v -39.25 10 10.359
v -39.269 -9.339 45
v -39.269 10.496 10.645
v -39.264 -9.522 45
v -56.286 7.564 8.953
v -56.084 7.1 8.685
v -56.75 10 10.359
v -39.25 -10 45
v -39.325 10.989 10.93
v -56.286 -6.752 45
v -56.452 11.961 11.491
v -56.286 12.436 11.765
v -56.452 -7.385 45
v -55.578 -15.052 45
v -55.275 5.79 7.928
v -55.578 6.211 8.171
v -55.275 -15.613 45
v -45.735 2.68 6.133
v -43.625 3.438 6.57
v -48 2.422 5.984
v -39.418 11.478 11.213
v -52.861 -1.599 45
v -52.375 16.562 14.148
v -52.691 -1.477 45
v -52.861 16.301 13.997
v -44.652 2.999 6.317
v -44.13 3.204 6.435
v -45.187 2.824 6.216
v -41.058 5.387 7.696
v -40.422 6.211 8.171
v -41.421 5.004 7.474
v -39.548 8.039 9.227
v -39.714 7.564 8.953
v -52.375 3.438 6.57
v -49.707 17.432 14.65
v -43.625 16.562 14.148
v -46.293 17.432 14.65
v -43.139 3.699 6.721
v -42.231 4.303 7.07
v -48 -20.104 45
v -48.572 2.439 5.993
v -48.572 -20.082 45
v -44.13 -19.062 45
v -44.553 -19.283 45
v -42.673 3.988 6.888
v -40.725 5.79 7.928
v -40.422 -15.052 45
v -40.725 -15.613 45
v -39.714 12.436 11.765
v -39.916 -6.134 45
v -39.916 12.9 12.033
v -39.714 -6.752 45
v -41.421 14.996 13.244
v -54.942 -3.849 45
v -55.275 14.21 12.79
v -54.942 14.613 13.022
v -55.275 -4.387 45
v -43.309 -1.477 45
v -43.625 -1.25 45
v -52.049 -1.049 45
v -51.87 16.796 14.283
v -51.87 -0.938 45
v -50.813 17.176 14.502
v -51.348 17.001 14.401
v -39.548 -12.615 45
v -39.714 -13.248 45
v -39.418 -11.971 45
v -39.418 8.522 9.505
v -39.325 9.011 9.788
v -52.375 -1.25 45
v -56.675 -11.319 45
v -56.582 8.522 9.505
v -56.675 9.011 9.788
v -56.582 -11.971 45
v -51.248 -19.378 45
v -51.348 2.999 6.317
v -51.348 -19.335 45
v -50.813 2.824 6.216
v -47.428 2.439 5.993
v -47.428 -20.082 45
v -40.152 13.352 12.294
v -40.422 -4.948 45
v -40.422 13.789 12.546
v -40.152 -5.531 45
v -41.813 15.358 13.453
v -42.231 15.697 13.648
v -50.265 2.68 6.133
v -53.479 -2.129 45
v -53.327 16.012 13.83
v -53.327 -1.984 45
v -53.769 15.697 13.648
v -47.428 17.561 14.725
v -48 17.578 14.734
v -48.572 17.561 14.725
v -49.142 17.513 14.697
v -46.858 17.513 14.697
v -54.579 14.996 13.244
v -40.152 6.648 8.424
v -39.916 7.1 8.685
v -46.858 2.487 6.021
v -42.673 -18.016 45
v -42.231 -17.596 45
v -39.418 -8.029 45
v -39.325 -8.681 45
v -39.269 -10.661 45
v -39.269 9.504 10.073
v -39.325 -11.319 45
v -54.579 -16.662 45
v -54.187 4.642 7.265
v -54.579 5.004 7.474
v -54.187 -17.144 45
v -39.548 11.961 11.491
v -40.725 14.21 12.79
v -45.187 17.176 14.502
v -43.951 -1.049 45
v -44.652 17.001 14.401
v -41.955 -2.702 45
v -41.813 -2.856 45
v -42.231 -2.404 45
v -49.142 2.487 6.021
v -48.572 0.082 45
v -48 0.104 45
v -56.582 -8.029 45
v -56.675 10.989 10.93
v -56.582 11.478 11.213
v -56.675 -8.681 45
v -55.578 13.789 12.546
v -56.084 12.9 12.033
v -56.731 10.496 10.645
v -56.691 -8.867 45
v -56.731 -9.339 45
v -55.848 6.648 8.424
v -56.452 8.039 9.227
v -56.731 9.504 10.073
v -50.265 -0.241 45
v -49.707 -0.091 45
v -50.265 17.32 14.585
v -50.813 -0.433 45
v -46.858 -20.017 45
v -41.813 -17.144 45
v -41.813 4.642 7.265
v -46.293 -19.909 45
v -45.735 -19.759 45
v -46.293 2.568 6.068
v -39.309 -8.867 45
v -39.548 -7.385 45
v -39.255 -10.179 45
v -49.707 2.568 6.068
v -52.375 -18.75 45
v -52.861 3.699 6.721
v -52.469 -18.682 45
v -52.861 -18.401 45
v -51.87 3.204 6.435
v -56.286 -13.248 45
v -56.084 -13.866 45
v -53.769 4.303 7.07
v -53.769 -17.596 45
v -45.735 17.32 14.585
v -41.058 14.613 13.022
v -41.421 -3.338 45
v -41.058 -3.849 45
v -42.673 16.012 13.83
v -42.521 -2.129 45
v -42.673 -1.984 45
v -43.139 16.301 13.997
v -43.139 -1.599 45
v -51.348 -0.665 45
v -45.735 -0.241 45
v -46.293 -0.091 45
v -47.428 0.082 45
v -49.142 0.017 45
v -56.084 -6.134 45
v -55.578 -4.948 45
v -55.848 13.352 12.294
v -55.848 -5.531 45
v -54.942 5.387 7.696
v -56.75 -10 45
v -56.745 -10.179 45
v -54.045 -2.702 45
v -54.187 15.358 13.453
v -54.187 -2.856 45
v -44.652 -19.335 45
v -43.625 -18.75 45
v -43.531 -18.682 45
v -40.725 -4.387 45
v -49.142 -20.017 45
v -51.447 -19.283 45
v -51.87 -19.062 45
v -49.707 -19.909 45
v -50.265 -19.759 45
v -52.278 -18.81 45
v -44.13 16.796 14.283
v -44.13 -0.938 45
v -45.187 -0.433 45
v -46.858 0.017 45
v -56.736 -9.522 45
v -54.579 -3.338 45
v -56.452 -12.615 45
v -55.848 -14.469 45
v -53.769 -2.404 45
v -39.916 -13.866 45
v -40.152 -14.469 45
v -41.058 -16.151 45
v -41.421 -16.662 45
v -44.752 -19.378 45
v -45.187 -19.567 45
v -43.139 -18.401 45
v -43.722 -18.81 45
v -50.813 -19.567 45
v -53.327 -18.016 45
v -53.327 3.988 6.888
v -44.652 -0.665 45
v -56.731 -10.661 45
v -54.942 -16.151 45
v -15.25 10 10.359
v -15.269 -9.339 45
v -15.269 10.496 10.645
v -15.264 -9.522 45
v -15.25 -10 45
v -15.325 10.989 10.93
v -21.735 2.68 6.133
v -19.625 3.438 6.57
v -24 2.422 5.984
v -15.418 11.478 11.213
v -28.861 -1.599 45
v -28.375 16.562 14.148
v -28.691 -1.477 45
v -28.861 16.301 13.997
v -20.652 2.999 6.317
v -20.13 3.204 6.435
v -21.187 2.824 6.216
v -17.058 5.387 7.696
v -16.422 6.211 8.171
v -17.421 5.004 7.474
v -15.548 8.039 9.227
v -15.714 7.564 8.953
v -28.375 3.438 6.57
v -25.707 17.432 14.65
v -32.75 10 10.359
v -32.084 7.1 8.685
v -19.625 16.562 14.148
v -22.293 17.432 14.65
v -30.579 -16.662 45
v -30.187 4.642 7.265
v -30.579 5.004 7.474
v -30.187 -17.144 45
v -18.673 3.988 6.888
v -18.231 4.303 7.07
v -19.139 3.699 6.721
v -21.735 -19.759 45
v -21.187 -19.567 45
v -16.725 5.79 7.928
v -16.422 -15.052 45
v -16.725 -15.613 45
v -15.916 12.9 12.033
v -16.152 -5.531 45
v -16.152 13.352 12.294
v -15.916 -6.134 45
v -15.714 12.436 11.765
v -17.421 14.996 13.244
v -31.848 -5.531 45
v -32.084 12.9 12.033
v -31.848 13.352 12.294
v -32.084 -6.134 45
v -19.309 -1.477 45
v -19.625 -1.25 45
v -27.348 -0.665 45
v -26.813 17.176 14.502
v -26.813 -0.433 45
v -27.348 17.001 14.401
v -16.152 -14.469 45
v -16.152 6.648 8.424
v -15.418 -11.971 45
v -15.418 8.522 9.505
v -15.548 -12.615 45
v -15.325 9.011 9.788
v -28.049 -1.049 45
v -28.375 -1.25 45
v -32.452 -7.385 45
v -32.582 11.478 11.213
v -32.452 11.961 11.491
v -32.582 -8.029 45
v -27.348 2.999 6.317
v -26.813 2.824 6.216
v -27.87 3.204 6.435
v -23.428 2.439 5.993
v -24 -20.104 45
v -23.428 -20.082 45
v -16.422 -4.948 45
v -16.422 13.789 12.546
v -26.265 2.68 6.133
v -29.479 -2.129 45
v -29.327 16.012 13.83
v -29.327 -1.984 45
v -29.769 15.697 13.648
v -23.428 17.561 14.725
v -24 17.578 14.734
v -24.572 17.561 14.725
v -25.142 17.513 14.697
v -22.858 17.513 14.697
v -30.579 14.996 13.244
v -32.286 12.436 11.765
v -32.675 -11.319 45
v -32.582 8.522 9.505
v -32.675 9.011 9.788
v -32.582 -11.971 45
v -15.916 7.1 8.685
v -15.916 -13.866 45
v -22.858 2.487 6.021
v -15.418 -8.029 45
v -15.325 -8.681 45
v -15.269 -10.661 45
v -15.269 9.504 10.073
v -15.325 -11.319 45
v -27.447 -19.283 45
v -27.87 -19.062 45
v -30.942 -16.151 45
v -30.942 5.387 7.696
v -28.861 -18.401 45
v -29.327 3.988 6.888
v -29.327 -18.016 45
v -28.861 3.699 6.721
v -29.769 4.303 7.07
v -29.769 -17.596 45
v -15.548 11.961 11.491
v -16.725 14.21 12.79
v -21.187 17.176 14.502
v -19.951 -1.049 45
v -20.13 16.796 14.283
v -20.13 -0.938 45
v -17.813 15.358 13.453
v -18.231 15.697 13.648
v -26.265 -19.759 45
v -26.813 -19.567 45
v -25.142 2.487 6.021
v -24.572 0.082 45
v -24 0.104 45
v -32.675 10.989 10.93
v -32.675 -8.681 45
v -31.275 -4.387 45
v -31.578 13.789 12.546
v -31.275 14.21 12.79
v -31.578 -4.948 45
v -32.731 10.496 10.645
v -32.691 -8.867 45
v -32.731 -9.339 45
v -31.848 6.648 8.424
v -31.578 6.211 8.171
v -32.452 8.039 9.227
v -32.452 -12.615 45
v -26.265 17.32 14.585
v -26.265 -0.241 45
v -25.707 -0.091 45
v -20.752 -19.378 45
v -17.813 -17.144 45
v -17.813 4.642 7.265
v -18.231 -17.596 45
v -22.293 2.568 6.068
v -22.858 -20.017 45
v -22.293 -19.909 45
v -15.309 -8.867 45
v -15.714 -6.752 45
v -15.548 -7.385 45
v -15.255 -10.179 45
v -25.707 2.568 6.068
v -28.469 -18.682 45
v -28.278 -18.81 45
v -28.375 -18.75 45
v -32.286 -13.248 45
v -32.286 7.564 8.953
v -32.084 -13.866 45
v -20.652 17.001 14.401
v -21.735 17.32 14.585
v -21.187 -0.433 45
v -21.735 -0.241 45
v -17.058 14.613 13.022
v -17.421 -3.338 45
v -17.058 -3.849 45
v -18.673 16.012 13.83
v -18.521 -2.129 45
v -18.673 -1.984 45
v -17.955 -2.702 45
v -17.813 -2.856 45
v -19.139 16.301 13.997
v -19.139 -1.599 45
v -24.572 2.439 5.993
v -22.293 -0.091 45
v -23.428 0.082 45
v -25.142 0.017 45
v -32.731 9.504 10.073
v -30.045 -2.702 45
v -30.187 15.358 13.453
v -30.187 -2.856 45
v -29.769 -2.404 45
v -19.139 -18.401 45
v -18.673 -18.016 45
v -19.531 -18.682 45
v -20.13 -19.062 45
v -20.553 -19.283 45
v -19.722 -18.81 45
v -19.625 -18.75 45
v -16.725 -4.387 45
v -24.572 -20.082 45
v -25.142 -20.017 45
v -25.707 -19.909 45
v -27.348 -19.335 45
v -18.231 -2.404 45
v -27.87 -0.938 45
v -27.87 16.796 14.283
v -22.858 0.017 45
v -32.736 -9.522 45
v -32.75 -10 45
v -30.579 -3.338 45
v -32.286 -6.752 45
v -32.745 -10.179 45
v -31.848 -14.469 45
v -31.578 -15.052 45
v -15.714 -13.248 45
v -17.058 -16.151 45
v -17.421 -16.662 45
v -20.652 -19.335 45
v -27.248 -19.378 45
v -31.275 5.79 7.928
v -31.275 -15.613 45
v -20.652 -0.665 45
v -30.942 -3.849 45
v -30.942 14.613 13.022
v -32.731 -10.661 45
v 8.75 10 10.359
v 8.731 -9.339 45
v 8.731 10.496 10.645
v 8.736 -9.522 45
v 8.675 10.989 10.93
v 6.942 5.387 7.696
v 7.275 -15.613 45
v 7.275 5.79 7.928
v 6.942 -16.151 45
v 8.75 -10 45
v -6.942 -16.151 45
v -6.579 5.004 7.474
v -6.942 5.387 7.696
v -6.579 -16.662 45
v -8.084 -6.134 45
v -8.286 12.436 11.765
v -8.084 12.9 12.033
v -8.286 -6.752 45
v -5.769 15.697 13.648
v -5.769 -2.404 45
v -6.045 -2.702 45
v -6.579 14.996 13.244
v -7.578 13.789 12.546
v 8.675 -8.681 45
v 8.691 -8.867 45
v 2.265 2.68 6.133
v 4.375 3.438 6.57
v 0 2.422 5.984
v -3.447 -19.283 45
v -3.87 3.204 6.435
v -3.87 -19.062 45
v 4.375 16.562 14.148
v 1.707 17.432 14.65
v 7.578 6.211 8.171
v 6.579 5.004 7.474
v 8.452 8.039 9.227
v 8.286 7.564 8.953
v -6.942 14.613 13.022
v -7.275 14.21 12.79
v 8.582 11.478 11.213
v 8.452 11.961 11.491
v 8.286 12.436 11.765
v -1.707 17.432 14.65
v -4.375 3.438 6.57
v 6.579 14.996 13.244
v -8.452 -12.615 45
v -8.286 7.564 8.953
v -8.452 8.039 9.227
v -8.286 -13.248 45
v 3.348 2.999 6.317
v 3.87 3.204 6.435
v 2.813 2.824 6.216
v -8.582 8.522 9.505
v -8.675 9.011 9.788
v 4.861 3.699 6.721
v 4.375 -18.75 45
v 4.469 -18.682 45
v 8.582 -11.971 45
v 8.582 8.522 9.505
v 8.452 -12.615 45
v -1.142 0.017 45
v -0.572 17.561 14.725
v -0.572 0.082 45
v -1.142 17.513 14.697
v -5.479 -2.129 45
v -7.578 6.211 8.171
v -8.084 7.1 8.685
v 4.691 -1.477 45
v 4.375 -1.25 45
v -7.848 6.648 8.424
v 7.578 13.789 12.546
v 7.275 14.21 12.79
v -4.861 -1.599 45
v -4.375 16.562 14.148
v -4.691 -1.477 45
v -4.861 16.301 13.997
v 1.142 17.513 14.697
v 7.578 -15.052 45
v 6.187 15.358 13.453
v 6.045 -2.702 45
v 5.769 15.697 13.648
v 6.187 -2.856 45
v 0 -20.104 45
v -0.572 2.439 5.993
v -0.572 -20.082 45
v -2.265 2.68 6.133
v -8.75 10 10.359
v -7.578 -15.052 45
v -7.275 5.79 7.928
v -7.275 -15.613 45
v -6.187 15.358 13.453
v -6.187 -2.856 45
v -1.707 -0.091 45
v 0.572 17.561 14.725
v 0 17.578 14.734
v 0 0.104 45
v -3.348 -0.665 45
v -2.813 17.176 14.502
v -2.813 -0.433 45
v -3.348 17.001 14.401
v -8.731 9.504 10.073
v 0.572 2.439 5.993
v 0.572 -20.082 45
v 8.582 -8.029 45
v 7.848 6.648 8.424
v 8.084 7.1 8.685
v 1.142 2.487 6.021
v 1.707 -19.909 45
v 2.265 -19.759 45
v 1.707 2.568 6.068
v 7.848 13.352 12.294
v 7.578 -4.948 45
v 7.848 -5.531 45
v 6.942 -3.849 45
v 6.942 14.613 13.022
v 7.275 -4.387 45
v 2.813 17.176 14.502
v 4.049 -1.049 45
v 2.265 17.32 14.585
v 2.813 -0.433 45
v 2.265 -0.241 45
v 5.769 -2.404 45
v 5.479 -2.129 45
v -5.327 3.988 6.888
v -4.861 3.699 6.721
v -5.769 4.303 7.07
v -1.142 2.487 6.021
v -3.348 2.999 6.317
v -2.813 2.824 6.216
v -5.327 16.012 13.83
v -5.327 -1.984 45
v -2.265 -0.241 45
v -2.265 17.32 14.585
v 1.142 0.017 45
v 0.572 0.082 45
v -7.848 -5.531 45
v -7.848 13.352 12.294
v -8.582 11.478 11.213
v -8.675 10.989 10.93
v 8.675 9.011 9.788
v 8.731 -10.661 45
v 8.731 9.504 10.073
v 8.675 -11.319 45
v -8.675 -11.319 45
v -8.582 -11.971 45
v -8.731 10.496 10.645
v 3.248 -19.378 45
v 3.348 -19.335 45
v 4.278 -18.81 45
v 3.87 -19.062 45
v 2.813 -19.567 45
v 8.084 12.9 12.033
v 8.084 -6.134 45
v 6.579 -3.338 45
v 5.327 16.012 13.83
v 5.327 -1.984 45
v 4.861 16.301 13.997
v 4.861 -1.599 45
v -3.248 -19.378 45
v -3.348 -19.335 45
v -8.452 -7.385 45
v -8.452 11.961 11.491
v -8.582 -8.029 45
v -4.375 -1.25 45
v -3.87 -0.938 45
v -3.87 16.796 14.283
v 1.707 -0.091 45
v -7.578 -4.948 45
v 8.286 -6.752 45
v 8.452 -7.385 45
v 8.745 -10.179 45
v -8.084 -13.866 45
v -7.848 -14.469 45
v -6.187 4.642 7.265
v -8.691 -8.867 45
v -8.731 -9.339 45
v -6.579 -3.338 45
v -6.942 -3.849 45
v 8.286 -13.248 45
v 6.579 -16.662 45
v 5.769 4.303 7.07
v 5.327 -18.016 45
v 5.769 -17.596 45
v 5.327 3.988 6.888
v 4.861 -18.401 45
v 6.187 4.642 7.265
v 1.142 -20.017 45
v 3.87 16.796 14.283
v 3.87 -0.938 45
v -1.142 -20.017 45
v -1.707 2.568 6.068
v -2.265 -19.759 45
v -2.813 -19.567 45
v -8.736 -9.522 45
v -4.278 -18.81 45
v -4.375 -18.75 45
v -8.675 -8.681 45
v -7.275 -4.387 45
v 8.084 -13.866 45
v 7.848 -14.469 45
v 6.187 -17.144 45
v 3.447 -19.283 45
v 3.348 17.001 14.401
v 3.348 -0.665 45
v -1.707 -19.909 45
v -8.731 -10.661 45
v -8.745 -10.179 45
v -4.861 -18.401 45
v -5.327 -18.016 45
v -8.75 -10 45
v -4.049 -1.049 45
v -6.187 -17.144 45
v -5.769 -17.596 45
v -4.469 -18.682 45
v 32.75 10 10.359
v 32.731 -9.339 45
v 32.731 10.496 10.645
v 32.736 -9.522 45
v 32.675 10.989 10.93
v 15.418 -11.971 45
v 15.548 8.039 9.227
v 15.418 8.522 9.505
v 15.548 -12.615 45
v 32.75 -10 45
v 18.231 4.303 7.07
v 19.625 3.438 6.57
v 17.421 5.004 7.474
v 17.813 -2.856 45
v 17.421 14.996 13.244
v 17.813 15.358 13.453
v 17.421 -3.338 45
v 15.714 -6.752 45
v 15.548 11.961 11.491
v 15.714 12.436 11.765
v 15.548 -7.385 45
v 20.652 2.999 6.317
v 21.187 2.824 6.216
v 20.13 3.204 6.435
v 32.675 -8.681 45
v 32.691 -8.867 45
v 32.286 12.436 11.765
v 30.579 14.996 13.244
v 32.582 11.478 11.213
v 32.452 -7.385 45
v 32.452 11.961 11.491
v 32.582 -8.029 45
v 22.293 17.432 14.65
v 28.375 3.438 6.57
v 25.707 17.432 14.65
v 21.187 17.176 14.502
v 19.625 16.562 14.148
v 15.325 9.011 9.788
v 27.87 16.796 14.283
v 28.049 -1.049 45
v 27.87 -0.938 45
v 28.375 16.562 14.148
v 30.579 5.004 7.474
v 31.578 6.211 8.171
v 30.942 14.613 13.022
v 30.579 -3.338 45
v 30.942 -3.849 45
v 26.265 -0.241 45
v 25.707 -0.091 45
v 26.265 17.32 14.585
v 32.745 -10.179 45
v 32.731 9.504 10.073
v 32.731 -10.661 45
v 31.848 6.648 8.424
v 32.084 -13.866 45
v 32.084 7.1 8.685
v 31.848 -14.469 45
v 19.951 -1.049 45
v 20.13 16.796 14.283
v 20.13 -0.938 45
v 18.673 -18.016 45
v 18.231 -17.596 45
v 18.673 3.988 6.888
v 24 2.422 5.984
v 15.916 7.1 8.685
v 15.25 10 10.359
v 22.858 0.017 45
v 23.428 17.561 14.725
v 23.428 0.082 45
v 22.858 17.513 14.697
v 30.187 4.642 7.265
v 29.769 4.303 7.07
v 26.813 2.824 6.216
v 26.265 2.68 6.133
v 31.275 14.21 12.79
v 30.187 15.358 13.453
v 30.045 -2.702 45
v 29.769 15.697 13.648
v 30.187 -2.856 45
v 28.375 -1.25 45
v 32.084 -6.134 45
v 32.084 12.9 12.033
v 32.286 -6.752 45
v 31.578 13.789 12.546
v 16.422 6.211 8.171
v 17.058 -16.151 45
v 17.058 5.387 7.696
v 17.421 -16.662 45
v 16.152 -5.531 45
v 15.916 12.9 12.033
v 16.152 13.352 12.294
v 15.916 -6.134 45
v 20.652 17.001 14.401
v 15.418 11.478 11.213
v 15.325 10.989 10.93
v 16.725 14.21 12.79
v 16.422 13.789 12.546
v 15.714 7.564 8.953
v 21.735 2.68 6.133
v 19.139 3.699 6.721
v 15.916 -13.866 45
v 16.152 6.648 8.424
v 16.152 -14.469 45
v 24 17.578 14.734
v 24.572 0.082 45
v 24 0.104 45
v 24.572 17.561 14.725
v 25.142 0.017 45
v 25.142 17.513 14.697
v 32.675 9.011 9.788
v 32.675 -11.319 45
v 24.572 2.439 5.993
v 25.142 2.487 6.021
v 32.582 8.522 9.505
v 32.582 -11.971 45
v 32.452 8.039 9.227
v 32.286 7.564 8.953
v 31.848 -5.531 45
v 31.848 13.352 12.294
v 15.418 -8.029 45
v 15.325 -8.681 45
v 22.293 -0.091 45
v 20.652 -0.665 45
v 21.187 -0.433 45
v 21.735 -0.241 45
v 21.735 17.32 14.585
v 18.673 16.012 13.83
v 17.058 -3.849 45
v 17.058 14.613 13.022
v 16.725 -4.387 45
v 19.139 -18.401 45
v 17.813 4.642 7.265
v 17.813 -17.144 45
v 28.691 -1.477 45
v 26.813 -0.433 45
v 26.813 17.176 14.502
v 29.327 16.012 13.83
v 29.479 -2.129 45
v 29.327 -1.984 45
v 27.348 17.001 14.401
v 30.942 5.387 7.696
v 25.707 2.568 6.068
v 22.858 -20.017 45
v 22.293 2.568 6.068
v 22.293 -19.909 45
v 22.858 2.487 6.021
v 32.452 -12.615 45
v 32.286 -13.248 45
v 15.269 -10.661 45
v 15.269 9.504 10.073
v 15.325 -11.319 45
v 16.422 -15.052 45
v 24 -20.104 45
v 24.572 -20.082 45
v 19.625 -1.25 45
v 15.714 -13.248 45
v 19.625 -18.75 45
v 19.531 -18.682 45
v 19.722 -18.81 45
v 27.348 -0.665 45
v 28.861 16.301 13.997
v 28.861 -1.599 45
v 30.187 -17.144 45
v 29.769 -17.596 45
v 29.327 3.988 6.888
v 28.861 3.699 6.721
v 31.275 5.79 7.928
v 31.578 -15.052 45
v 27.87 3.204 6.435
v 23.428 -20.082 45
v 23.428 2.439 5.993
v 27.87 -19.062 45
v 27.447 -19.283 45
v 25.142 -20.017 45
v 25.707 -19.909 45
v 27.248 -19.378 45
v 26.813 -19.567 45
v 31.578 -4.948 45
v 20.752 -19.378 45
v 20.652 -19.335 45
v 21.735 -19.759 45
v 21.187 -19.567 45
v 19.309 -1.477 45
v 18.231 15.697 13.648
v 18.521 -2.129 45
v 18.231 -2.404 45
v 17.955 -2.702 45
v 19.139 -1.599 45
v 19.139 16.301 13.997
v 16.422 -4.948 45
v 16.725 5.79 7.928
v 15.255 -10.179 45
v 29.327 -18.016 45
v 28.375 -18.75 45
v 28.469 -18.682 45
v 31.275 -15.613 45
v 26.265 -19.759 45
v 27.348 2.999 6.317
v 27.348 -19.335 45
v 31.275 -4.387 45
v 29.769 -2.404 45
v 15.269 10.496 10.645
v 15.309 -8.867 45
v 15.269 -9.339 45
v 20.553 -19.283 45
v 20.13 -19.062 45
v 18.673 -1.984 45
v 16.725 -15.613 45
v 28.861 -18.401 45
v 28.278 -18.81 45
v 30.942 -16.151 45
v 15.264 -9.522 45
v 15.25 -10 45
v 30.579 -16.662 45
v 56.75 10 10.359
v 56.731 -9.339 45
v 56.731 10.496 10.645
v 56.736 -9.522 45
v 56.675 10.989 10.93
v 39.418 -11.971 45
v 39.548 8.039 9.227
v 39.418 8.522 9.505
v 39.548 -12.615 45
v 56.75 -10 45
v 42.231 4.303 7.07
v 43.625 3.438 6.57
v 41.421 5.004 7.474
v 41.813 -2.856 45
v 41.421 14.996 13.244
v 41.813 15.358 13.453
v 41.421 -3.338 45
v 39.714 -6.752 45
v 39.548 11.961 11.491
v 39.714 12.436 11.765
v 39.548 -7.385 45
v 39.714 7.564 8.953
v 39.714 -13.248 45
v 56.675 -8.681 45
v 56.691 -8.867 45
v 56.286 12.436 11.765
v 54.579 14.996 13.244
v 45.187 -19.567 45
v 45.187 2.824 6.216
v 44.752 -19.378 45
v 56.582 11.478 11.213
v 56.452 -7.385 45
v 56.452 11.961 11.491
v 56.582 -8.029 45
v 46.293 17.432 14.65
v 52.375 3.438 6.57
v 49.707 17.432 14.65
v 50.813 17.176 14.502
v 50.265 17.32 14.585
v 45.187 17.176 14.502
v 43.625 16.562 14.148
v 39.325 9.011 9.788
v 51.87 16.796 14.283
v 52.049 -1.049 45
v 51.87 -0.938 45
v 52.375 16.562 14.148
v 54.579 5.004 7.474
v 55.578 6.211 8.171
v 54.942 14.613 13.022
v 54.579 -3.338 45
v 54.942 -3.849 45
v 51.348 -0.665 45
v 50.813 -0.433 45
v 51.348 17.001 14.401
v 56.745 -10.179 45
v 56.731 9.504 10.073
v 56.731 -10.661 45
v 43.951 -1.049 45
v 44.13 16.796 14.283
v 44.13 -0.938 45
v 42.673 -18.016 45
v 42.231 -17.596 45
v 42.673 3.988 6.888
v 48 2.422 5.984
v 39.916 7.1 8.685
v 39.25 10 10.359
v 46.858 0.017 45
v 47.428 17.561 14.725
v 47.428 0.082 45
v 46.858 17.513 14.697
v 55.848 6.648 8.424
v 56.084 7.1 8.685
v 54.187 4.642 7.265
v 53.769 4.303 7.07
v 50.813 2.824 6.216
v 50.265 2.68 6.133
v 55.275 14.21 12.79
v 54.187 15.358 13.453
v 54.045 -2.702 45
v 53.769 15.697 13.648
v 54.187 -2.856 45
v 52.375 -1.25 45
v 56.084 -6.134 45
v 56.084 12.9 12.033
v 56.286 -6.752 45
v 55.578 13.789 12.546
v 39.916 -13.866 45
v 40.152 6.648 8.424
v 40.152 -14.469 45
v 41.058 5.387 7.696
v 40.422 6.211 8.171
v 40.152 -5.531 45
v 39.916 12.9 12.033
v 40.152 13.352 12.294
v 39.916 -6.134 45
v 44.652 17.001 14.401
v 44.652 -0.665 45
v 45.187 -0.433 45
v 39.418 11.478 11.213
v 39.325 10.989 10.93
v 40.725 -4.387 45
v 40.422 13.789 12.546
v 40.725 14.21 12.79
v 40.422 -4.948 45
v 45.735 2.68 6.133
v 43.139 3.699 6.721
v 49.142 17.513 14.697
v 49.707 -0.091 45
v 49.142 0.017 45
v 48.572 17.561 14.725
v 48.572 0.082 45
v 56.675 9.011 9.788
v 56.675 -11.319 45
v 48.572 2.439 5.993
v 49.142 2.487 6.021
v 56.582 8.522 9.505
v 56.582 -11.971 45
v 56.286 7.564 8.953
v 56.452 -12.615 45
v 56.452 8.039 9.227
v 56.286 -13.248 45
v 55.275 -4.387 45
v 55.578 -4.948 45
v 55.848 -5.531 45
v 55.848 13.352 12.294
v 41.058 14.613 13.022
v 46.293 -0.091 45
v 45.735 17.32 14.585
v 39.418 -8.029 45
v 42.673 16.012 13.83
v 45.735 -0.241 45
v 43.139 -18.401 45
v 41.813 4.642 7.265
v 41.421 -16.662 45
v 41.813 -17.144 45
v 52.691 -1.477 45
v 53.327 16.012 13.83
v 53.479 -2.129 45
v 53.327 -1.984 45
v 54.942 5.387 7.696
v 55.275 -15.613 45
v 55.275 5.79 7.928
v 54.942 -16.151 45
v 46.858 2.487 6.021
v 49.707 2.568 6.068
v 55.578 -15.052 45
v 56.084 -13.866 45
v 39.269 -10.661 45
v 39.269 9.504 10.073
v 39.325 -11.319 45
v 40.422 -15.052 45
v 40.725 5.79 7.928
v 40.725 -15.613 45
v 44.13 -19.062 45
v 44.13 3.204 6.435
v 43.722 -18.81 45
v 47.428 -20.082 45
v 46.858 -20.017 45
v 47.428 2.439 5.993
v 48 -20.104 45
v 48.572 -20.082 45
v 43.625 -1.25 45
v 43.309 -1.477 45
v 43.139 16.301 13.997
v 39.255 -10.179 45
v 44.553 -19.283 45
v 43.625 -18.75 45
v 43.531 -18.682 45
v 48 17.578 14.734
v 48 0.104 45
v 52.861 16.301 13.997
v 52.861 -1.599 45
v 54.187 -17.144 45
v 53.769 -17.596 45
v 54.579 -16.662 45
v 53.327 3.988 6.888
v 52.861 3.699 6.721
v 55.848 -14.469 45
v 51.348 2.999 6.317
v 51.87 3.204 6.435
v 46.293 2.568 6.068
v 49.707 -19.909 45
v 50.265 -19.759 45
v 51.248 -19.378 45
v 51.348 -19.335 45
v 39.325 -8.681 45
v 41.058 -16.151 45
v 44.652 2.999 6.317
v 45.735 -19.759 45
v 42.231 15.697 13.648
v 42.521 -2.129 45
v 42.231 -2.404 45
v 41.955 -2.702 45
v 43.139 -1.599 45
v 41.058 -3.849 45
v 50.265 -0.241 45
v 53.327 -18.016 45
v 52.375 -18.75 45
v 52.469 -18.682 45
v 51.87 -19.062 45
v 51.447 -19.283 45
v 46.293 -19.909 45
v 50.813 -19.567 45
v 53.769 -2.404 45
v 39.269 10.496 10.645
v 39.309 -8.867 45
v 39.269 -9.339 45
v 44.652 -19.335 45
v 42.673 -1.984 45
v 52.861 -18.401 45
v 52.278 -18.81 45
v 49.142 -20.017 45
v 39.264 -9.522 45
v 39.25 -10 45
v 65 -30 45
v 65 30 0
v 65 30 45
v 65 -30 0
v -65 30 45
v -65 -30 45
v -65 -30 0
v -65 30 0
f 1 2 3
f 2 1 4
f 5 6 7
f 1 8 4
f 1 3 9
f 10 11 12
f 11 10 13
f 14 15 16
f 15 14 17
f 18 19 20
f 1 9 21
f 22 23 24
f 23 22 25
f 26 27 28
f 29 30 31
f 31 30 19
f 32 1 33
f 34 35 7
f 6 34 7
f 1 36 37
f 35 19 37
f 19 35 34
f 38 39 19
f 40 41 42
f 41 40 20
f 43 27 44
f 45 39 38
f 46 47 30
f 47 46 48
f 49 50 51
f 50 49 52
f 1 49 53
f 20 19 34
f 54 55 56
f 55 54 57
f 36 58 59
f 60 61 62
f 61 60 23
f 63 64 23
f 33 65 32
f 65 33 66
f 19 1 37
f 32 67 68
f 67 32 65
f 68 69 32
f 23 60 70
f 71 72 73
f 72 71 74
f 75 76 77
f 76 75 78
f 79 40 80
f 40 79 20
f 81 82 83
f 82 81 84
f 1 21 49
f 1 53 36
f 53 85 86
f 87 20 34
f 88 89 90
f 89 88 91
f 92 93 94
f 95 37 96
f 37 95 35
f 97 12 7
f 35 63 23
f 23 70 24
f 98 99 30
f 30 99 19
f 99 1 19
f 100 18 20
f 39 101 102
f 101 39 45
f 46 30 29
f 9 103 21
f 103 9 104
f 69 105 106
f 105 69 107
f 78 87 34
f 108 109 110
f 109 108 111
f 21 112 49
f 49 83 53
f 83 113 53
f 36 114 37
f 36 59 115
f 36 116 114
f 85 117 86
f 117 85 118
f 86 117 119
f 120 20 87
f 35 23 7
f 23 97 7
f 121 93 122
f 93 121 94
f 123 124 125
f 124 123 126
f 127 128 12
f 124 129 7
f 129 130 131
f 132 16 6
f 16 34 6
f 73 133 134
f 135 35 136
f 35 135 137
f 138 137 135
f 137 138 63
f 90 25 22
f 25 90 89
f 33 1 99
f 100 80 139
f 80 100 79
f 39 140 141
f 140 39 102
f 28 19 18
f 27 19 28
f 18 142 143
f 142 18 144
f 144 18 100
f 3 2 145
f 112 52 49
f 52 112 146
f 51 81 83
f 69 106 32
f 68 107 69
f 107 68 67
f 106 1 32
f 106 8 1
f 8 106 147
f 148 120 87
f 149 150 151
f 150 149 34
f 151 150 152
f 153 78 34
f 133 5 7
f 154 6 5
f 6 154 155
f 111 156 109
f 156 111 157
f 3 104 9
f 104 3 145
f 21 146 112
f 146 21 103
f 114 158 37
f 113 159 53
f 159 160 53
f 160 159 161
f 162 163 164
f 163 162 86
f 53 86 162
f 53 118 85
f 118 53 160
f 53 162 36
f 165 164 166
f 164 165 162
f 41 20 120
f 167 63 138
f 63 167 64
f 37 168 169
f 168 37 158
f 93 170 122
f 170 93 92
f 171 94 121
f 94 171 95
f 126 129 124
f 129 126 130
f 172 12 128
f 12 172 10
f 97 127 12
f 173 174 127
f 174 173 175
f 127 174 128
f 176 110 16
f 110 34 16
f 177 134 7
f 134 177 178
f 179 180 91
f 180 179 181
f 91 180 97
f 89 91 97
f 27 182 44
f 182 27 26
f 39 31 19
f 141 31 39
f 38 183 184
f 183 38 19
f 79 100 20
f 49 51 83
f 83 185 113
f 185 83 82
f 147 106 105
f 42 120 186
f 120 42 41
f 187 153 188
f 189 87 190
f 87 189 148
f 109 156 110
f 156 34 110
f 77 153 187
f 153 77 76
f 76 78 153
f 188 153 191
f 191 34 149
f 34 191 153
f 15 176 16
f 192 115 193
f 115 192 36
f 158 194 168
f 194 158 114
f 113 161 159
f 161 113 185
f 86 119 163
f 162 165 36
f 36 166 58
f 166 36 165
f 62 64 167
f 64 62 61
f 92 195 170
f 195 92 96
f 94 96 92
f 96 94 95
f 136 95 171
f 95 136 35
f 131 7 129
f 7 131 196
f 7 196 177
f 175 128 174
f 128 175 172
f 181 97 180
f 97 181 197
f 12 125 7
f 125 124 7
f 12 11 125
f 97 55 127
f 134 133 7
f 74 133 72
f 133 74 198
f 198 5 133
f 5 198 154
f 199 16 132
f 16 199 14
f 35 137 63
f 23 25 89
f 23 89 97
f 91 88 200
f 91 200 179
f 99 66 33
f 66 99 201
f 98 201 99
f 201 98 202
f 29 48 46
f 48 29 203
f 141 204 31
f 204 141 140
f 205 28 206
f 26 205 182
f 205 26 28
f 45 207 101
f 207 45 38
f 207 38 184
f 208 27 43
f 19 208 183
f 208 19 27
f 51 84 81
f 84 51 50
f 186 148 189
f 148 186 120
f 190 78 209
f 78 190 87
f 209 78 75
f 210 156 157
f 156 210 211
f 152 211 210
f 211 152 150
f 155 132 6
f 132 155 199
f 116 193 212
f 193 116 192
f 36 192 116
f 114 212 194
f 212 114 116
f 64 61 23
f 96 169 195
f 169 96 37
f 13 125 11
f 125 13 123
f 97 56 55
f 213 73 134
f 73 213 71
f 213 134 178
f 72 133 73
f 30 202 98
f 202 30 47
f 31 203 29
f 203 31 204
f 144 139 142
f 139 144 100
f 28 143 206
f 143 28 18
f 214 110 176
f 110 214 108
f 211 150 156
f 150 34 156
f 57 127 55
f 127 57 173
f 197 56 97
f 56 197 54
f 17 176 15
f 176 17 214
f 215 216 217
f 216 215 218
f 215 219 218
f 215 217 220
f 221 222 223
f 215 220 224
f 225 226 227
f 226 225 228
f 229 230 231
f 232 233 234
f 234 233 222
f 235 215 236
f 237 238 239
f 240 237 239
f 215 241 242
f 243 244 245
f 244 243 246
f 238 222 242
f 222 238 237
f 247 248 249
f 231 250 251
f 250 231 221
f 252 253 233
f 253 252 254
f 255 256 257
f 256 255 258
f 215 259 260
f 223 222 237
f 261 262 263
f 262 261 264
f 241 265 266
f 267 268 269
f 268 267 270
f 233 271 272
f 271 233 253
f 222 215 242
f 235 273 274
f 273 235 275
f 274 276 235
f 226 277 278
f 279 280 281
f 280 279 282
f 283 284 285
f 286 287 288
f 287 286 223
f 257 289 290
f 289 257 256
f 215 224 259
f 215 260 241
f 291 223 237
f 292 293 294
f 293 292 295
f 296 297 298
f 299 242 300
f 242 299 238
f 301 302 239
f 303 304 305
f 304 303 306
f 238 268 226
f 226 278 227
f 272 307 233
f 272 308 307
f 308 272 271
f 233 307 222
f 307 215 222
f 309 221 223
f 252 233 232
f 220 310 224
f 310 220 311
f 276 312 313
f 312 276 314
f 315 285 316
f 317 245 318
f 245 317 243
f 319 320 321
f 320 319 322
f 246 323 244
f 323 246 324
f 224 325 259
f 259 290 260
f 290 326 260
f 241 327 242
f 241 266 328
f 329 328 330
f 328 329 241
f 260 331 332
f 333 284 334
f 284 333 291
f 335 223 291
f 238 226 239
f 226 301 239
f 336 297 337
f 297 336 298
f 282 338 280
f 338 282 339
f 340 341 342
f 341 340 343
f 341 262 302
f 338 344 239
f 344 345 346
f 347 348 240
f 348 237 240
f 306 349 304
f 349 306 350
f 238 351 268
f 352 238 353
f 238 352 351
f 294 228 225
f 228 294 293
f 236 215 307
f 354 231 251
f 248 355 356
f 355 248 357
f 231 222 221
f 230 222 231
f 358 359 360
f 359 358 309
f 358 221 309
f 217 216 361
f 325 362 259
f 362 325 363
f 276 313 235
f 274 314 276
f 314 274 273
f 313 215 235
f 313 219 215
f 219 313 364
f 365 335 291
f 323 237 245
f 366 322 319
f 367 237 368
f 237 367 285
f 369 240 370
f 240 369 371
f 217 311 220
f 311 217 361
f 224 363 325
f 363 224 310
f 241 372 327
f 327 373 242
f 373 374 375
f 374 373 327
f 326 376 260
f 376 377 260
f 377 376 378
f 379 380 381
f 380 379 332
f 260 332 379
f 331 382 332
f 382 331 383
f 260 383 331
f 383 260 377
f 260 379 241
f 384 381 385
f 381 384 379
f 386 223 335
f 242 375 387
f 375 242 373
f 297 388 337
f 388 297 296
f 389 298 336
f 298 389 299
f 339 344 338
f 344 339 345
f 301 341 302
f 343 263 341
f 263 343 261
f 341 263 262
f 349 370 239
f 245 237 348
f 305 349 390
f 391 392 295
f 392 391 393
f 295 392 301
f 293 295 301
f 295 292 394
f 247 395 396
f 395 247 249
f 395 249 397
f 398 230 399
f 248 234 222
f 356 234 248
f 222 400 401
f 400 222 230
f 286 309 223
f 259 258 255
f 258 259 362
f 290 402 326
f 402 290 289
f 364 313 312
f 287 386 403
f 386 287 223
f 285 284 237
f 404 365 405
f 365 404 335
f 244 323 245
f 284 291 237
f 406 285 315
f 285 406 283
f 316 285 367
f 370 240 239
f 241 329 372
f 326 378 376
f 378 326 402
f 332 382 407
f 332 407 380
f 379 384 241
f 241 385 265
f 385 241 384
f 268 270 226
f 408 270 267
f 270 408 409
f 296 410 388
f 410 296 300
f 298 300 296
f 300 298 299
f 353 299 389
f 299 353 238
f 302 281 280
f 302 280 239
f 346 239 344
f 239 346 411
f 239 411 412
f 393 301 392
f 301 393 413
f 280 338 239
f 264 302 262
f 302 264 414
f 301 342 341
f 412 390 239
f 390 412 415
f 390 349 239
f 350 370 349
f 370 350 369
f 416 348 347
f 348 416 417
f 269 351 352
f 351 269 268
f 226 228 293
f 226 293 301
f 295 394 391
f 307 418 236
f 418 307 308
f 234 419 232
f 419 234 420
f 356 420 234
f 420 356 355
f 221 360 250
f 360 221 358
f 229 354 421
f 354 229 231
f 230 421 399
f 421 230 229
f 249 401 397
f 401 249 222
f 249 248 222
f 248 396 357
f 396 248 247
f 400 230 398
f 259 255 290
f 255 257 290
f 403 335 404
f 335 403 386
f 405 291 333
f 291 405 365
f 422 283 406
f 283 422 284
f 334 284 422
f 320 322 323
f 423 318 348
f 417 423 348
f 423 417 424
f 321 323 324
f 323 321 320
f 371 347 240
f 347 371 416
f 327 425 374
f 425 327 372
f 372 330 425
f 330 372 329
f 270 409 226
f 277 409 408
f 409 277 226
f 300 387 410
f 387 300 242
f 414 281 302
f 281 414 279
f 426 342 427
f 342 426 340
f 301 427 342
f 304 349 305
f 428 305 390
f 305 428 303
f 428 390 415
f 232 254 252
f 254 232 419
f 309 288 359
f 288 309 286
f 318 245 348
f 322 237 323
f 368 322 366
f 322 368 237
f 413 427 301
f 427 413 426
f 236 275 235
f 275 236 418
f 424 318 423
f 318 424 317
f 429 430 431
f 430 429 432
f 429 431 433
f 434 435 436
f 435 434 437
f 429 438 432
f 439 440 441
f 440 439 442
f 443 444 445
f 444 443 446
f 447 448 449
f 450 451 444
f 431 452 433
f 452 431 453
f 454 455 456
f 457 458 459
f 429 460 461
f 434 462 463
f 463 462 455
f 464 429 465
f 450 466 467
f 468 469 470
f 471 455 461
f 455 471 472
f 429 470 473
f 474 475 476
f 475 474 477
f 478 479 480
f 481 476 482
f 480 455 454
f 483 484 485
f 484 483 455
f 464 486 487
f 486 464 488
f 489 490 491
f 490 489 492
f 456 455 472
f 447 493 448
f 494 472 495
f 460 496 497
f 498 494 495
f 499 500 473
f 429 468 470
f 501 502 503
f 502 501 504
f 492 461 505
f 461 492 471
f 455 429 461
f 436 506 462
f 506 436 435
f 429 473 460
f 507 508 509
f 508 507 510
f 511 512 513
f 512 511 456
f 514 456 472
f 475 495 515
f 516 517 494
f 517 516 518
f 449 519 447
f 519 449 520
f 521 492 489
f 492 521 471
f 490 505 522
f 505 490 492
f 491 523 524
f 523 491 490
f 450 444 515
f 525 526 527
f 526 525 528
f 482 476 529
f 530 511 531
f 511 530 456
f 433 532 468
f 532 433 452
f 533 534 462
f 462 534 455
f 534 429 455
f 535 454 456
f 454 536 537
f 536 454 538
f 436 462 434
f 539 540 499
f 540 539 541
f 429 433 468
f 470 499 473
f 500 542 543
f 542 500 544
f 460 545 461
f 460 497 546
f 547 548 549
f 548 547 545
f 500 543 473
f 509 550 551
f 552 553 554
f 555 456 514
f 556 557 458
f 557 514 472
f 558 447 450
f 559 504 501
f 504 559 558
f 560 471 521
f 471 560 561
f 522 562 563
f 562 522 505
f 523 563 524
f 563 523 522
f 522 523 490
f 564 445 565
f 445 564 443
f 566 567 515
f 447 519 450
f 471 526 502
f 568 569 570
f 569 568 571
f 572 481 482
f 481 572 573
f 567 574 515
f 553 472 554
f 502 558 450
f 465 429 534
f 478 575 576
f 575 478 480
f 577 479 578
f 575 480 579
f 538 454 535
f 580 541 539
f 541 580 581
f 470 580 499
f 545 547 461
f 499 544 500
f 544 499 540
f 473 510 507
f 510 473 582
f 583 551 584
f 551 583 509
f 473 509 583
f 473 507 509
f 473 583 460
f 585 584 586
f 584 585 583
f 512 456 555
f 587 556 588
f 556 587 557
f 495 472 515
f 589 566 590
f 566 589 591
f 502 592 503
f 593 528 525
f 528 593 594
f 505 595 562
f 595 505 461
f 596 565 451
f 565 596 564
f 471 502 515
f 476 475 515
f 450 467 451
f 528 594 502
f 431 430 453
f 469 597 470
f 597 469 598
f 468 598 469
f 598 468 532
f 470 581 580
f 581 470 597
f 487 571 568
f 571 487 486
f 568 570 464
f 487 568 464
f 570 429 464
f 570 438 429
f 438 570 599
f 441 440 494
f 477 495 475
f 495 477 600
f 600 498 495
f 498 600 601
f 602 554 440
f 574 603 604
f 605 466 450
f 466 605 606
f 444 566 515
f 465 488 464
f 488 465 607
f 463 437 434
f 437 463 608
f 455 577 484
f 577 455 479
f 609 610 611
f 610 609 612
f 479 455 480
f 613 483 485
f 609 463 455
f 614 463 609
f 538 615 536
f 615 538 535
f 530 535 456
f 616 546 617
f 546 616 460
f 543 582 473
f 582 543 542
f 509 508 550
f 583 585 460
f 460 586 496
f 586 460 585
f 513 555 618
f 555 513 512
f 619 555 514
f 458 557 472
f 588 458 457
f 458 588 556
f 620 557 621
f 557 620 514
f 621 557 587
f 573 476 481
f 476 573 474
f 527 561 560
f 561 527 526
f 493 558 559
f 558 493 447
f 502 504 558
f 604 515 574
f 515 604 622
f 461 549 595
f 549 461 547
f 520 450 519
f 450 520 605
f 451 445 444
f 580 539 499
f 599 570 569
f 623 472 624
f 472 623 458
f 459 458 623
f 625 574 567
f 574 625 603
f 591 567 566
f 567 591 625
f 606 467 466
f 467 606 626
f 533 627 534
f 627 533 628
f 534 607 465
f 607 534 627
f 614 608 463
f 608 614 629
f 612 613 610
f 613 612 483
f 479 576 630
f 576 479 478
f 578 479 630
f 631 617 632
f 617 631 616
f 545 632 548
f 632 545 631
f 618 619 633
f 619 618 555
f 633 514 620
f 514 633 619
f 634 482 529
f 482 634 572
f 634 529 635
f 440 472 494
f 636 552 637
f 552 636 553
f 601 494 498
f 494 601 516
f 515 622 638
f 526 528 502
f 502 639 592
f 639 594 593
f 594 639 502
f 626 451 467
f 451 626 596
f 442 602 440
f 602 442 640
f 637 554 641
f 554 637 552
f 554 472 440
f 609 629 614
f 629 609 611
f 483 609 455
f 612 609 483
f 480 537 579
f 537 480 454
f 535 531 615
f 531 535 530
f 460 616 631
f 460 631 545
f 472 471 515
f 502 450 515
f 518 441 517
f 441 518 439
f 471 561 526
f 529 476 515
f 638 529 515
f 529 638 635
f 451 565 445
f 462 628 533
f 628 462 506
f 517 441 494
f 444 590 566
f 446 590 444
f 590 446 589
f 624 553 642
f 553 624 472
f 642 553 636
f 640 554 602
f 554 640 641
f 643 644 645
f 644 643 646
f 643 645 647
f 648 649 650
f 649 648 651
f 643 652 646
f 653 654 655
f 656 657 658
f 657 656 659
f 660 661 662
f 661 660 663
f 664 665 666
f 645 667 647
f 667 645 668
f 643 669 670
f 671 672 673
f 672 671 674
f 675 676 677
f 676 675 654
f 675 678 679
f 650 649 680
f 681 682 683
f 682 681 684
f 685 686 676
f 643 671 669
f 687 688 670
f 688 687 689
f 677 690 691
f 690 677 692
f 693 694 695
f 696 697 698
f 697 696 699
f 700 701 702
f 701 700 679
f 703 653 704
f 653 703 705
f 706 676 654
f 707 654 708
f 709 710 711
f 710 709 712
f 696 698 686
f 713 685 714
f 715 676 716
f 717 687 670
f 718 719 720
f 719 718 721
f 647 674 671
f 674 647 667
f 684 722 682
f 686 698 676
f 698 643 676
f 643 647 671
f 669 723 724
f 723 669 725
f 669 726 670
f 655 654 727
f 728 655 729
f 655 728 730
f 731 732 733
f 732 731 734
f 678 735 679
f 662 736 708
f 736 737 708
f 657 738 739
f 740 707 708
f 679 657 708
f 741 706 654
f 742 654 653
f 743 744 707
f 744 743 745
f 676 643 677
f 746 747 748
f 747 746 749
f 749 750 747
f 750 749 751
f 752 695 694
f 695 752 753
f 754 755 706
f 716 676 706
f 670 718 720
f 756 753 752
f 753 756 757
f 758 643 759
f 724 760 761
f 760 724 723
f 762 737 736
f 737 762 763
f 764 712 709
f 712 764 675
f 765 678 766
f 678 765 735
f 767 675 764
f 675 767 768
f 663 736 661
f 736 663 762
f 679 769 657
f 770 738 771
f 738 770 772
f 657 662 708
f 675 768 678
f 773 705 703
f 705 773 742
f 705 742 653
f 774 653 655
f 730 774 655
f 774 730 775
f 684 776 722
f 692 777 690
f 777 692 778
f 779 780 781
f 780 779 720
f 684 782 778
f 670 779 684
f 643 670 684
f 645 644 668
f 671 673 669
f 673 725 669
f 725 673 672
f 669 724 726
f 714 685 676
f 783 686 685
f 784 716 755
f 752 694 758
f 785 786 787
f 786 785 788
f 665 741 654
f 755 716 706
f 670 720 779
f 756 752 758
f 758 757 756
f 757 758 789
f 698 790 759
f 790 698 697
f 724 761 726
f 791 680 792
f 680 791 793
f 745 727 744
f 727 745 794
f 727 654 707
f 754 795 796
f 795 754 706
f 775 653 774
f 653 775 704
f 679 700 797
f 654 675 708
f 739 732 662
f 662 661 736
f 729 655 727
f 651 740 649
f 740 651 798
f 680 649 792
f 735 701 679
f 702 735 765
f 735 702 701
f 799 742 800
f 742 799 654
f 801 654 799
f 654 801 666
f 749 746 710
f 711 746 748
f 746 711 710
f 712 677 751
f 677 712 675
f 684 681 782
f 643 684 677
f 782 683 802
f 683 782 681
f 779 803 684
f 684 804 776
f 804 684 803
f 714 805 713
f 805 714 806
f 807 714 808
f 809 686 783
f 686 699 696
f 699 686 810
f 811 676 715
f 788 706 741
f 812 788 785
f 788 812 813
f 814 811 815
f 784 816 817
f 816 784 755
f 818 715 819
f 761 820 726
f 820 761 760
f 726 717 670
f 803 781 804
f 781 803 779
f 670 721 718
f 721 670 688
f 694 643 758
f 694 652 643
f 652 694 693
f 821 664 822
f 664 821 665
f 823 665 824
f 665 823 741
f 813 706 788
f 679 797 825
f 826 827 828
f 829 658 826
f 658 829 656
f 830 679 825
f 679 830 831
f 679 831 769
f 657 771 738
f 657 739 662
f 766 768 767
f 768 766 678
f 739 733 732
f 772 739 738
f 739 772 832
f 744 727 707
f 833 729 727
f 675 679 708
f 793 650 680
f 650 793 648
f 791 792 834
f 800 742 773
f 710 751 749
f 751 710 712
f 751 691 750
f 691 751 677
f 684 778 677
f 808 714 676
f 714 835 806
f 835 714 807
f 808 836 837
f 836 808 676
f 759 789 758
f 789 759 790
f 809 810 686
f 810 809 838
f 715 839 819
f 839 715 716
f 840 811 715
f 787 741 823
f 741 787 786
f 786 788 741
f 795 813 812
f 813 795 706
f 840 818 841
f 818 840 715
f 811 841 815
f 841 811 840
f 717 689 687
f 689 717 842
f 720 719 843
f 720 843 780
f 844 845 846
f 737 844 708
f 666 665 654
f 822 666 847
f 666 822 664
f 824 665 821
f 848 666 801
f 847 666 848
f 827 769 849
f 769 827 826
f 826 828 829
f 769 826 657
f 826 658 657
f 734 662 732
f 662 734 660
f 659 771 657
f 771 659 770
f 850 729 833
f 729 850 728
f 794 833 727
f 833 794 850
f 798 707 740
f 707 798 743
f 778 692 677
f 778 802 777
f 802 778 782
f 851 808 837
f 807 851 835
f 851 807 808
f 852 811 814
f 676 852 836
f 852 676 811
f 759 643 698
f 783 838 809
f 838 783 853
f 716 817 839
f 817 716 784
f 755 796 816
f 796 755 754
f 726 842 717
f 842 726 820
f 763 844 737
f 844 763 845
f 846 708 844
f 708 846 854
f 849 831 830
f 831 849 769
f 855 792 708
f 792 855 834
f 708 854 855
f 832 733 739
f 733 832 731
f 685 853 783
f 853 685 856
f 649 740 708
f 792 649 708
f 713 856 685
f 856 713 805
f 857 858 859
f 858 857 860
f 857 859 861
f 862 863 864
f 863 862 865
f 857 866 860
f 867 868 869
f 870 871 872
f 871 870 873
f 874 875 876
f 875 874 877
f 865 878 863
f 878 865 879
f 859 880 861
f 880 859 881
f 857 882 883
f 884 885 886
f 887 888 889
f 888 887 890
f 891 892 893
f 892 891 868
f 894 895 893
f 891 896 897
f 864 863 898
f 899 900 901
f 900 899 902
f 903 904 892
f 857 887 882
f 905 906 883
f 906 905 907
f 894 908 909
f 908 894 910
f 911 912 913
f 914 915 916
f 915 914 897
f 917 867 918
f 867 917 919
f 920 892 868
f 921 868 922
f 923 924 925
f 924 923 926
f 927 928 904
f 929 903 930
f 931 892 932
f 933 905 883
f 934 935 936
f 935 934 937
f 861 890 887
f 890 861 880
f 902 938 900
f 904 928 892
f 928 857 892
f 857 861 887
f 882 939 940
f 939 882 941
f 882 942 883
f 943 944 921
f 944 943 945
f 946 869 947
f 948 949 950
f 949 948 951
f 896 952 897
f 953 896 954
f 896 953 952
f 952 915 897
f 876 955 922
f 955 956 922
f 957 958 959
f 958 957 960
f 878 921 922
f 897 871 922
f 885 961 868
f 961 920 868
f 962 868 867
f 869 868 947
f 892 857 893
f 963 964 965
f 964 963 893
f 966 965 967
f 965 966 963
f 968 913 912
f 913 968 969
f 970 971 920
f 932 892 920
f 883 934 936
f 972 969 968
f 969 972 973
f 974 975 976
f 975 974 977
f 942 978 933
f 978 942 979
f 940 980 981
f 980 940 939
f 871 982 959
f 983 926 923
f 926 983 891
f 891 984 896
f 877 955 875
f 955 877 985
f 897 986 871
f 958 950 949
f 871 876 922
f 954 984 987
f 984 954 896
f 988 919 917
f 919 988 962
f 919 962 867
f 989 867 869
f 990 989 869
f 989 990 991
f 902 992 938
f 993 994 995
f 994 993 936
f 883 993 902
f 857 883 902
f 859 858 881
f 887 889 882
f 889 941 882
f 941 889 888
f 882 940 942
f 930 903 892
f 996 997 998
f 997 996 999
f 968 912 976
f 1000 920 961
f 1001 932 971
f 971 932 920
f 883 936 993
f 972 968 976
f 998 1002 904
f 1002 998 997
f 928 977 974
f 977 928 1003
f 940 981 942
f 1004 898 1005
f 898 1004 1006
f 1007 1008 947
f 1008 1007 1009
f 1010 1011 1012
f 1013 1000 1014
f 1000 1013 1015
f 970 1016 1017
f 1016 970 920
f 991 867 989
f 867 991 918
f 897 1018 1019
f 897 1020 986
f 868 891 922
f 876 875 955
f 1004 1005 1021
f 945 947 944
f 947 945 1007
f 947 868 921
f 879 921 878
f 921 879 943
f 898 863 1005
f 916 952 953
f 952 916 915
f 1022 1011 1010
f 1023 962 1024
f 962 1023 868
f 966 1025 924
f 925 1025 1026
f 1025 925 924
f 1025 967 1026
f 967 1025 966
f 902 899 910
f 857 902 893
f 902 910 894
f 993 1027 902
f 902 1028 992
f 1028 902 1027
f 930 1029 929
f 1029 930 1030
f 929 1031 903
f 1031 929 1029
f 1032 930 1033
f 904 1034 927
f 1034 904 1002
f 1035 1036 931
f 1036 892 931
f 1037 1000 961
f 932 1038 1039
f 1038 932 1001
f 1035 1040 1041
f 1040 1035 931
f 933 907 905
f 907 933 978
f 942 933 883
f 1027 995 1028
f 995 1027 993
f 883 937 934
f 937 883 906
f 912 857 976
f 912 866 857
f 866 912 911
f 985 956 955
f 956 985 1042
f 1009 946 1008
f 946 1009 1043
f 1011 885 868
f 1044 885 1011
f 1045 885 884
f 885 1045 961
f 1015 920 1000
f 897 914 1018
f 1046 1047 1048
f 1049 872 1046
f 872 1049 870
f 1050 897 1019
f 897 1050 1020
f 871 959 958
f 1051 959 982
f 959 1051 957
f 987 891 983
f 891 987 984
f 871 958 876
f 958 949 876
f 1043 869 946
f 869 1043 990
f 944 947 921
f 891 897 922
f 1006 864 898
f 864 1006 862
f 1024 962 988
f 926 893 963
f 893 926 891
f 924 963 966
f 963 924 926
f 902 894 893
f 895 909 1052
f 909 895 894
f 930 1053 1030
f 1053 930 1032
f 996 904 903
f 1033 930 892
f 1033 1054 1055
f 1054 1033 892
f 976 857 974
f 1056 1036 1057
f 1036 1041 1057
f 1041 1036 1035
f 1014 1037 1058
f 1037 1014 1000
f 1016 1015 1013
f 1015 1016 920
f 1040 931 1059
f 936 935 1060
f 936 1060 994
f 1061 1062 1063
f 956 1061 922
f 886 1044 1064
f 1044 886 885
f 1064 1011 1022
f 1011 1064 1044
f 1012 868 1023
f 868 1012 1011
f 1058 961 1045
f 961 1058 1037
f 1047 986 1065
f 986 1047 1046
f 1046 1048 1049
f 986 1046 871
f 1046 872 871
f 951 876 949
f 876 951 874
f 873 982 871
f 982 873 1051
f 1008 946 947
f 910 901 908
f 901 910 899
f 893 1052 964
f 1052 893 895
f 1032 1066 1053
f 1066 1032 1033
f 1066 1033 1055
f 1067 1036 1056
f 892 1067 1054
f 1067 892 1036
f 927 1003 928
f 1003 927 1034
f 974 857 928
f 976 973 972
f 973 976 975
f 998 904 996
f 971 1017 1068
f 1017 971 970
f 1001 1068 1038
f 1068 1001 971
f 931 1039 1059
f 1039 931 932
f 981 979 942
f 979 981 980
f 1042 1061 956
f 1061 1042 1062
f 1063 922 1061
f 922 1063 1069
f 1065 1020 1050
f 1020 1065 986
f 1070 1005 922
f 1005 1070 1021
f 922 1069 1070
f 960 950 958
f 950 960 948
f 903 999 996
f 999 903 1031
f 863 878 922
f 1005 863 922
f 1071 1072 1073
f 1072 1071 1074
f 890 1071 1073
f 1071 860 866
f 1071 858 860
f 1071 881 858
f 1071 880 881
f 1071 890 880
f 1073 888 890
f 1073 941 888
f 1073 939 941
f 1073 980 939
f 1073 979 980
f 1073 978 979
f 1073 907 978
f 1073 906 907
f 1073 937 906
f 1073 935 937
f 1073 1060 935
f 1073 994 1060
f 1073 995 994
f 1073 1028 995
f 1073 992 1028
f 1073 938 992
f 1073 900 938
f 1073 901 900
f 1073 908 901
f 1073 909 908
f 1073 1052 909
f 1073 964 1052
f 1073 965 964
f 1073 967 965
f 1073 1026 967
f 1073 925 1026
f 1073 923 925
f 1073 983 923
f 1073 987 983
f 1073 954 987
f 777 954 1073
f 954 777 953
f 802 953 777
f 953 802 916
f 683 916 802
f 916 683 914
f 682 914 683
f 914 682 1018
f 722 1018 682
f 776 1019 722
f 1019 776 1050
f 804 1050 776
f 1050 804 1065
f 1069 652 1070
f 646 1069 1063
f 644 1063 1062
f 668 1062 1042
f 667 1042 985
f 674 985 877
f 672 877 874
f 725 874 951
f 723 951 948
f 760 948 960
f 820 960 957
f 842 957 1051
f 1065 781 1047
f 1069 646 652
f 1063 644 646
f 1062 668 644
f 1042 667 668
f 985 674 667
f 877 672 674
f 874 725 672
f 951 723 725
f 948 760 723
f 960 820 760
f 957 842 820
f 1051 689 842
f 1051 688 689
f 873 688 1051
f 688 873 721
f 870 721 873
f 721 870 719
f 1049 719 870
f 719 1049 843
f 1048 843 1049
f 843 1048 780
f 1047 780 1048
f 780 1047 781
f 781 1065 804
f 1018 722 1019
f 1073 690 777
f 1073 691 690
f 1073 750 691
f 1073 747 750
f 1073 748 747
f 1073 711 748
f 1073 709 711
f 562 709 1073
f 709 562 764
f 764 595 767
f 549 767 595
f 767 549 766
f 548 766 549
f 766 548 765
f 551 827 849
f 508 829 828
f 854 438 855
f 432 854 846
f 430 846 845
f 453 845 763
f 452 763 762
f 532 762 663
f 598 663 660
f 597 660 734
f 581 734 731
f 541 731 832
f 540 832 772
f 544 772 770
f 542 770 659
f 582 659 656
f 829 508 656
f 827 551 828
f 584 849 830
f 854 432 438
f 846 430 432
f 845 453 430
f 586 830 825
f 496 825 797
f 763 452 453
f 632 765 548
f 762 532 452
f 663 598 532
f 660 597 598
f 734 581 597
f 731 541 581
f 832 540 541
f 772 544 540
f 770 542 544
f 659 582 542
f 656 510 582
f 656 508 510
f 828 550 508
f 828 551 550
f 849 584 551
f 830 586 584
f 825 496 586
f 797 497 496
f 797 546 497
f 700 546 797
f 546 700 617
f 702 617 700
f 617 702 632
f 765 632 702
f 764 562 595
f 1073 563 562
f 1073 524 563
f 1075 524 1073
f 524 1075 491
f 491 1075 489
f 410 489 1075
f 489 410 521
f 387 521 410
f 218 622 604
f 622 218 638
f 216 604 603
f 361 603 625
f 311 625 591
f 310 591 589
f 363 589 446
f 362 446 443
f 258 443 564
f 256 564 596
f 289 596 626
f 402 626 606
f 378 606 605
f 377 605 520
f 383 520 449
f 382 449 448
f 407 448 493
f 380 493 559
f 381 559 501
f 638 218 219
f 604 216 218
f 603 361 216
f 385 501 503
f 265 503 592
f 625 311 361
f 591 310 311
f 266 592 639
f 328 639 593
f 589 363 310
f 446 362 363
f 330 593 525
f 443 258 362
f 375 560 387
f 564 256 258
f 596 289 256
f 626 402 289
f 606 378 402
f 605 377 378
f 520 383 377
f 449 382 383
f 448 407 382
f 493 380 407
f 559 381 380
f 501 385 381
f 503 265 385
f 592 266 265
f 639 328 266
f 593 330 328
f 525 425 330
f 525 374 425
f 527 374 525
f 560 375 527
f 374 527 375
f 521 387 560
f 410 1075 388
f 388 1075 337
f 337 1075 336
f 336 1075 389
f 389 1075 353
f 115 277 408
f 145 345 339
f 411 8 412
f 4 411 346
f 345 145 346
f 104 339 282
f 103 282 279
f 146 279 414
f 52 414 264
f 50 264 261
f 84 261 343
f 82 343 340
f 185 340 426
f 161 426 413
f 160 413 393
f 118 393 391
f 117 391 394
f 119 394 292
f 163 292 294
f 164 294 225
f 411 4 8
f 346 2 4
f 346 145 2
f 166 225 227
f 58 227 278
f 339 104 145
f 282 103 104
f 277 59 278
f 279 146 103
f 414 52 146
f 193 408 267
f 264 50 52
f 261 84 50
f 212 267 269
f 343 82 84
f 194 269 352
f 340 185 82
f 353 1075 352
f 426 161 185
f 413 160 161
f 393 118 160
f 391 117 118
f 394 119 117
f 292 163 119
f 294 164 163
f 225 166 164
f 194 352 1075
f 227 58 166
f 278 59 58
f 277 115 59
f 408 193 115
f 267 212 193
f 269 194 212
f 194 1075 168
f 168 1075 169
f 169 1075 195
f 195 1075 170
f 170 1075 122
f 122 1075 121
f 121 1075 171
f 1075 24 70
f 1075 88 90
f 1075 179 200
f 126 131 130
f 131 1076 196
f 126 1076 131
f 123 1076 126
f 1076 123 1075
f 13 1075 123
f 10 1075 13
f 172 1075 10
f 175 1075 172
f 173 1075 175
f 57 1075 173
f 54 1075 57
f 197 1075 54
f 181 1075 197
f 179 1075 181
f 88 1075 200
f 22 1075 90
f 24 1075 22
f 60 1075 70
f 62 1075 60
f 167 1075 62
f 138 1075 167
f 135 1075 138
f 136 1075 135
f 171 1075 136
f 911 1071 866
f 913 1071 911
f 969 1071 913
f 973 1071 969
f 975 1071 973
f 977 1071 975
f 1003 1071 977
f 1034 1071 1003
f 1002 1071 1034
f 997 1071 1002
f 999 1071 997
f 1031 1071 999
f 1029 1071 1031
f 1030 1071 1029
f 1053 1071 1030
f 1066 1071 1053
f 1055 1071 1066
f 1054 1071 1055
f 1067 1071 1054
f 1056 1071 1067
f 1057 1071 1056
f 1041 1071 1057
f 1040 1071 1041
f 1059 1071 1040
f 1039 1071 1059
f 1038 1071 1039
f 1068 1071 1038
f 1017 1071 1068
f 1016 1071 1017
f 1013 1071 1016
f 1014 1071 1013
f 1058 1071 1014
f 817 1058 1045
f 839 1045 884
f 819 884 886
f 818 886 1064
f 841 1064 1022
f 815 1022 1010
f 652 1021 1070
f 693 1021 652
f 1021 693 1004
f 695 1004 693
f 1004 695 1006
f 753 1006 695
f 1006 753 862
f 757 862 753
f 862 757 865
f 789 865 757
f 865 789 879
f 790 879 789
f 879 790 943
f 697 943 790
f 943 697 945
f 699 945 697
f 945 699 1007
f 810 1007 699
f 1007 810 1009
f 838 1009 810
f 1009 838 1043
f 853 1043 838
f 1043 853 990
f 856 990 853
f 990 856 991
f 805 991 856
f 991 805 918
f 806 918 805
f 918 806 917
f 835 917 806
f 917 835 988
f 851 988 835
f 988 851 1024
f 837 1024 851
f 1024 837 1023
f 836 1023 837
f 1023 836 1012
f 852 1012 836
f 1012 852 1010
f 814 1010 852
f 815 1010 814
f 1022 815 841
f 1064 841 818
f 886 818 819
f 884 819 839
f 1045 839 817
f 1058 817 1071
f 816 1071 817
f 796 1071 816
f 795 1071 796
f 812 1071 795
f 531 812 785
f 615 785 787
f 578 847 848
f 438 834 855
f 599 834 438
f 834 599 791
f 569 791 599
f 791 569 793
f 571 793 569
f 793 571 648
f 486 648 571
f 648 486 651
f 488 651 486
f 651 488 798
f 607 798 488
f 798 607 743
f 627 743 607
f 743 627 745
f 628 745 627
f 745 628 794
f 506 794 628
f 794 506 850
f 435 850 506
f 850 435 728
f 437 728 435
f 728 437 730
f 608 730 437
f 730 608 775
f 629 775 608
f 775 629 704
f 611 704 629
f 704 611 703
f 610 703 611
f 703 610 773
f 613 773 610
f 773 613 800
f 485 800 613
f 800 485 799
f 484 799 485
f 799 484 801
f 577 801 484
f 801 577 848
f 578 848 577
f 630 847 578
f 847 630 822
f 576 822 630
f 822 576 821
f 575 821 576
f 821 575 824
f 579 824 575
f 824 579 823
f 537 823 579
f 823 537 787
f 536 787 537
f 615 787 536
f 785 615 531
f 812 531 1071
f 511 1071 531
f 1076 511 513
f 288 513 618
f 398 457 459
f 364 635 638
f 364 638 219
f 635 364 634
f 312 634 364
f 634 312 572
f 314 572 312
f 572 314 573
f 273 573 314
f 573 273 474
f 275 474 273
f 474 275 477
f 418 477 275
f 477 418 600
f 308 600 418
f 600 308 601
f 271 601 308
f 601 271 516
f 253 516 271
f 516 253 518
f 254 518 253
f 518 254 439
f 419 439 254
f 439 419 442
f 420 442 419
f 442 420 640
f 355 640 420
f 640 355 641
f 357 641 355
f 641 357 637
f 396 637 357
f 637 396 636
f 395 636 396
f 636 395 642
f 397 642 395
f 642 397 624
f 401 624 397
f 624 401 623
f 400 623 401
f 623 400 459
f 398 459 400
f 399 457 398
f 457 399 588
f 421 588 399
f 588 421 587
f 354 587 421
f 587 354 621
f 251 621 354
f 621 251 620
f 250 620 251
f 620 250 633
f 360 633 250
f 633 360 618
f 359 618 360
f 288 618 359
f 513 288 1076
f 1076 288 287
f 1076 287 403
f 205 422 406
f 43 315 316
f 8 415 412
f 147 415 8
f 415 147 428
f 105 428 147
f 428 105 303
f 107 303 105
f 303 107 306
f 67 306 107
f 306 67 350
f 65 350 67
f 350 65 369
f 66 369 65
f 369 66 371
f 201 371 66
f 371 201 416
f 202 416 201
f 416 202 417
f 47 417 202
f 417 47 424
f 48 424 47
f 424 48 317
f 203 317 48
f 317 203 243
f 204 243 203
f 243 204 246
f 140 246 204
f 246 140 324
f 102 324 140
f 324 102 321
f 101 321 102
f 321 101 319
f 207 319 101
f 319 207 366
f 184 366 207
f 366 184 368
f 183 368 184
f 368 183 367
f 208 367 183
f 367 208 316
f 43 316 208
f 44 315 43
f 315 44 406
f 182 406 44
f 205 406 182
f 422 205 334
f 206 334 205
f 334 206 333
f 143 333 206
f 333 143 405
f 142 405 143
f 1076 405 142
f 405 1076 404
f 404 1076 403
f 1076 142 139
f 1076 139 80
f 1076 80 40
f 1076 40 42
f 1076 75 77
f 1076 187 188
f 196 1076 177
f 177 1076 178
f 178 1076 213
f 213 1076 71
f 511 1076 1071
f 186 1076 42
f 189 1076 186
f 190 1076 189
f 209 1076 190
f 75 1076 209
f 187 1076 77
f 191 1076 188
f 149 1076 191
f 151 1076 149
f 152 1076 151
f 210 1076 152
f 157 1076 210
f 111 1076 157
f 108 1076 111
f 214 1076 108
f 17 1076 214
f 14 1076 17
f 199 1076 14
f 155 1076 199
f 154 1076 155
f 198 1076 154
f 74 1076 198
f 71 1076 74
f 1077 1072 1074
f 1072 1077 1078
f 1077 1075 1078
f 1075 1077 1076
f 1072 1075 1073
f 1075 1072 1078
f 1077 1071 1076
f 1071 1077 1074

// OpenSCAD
// Rack that holds five 15 mL conical tubes at a 30-degree lean (reading volumes, pipetting off
// supernatant). Category: benchware. A solid block with five blind holes tilted 30 degrees from
// vertical; the hole roofs overhang at 60 degrees from horizontal, so it prints without supports.
// Print: PLA or PETG, standing on the bed, 0.2 mm layers, 15 % infill.
// SPDX-License-Identifier: CERN-OHL-P-2.0

/* [Rack] */
block = [130, 60, 45];    // X, Y, Z [mm], centred in X and Y
n = 5;
pitch = 24;               // along X
hole_d = 17.5;            // square to the axis
tilt = 30;                // degrees from vertical; going down, the hole moves toward +Y
entry_y = -10;            // the axis meets the top face at y = -10
depth = 40;               // along the axis, flat end square to the axis

/* [Hidden] */
eps = 0.01;

difference() {
    translate([-block.x / 2, -block.y / 2, 0]) cube(block);
    for (i = [0 : n - 1])
        translate([(i - (n - 1) / 2) * pitch, entry_y, block.z])
            rotate([tilt, 0, 0])            // local +Z (up the hole) -> (0, -sin, cos)
                translate([0, 0, -depth]) cylinder(d = hole_d, h = depth + 15, $fn = 96);
}
